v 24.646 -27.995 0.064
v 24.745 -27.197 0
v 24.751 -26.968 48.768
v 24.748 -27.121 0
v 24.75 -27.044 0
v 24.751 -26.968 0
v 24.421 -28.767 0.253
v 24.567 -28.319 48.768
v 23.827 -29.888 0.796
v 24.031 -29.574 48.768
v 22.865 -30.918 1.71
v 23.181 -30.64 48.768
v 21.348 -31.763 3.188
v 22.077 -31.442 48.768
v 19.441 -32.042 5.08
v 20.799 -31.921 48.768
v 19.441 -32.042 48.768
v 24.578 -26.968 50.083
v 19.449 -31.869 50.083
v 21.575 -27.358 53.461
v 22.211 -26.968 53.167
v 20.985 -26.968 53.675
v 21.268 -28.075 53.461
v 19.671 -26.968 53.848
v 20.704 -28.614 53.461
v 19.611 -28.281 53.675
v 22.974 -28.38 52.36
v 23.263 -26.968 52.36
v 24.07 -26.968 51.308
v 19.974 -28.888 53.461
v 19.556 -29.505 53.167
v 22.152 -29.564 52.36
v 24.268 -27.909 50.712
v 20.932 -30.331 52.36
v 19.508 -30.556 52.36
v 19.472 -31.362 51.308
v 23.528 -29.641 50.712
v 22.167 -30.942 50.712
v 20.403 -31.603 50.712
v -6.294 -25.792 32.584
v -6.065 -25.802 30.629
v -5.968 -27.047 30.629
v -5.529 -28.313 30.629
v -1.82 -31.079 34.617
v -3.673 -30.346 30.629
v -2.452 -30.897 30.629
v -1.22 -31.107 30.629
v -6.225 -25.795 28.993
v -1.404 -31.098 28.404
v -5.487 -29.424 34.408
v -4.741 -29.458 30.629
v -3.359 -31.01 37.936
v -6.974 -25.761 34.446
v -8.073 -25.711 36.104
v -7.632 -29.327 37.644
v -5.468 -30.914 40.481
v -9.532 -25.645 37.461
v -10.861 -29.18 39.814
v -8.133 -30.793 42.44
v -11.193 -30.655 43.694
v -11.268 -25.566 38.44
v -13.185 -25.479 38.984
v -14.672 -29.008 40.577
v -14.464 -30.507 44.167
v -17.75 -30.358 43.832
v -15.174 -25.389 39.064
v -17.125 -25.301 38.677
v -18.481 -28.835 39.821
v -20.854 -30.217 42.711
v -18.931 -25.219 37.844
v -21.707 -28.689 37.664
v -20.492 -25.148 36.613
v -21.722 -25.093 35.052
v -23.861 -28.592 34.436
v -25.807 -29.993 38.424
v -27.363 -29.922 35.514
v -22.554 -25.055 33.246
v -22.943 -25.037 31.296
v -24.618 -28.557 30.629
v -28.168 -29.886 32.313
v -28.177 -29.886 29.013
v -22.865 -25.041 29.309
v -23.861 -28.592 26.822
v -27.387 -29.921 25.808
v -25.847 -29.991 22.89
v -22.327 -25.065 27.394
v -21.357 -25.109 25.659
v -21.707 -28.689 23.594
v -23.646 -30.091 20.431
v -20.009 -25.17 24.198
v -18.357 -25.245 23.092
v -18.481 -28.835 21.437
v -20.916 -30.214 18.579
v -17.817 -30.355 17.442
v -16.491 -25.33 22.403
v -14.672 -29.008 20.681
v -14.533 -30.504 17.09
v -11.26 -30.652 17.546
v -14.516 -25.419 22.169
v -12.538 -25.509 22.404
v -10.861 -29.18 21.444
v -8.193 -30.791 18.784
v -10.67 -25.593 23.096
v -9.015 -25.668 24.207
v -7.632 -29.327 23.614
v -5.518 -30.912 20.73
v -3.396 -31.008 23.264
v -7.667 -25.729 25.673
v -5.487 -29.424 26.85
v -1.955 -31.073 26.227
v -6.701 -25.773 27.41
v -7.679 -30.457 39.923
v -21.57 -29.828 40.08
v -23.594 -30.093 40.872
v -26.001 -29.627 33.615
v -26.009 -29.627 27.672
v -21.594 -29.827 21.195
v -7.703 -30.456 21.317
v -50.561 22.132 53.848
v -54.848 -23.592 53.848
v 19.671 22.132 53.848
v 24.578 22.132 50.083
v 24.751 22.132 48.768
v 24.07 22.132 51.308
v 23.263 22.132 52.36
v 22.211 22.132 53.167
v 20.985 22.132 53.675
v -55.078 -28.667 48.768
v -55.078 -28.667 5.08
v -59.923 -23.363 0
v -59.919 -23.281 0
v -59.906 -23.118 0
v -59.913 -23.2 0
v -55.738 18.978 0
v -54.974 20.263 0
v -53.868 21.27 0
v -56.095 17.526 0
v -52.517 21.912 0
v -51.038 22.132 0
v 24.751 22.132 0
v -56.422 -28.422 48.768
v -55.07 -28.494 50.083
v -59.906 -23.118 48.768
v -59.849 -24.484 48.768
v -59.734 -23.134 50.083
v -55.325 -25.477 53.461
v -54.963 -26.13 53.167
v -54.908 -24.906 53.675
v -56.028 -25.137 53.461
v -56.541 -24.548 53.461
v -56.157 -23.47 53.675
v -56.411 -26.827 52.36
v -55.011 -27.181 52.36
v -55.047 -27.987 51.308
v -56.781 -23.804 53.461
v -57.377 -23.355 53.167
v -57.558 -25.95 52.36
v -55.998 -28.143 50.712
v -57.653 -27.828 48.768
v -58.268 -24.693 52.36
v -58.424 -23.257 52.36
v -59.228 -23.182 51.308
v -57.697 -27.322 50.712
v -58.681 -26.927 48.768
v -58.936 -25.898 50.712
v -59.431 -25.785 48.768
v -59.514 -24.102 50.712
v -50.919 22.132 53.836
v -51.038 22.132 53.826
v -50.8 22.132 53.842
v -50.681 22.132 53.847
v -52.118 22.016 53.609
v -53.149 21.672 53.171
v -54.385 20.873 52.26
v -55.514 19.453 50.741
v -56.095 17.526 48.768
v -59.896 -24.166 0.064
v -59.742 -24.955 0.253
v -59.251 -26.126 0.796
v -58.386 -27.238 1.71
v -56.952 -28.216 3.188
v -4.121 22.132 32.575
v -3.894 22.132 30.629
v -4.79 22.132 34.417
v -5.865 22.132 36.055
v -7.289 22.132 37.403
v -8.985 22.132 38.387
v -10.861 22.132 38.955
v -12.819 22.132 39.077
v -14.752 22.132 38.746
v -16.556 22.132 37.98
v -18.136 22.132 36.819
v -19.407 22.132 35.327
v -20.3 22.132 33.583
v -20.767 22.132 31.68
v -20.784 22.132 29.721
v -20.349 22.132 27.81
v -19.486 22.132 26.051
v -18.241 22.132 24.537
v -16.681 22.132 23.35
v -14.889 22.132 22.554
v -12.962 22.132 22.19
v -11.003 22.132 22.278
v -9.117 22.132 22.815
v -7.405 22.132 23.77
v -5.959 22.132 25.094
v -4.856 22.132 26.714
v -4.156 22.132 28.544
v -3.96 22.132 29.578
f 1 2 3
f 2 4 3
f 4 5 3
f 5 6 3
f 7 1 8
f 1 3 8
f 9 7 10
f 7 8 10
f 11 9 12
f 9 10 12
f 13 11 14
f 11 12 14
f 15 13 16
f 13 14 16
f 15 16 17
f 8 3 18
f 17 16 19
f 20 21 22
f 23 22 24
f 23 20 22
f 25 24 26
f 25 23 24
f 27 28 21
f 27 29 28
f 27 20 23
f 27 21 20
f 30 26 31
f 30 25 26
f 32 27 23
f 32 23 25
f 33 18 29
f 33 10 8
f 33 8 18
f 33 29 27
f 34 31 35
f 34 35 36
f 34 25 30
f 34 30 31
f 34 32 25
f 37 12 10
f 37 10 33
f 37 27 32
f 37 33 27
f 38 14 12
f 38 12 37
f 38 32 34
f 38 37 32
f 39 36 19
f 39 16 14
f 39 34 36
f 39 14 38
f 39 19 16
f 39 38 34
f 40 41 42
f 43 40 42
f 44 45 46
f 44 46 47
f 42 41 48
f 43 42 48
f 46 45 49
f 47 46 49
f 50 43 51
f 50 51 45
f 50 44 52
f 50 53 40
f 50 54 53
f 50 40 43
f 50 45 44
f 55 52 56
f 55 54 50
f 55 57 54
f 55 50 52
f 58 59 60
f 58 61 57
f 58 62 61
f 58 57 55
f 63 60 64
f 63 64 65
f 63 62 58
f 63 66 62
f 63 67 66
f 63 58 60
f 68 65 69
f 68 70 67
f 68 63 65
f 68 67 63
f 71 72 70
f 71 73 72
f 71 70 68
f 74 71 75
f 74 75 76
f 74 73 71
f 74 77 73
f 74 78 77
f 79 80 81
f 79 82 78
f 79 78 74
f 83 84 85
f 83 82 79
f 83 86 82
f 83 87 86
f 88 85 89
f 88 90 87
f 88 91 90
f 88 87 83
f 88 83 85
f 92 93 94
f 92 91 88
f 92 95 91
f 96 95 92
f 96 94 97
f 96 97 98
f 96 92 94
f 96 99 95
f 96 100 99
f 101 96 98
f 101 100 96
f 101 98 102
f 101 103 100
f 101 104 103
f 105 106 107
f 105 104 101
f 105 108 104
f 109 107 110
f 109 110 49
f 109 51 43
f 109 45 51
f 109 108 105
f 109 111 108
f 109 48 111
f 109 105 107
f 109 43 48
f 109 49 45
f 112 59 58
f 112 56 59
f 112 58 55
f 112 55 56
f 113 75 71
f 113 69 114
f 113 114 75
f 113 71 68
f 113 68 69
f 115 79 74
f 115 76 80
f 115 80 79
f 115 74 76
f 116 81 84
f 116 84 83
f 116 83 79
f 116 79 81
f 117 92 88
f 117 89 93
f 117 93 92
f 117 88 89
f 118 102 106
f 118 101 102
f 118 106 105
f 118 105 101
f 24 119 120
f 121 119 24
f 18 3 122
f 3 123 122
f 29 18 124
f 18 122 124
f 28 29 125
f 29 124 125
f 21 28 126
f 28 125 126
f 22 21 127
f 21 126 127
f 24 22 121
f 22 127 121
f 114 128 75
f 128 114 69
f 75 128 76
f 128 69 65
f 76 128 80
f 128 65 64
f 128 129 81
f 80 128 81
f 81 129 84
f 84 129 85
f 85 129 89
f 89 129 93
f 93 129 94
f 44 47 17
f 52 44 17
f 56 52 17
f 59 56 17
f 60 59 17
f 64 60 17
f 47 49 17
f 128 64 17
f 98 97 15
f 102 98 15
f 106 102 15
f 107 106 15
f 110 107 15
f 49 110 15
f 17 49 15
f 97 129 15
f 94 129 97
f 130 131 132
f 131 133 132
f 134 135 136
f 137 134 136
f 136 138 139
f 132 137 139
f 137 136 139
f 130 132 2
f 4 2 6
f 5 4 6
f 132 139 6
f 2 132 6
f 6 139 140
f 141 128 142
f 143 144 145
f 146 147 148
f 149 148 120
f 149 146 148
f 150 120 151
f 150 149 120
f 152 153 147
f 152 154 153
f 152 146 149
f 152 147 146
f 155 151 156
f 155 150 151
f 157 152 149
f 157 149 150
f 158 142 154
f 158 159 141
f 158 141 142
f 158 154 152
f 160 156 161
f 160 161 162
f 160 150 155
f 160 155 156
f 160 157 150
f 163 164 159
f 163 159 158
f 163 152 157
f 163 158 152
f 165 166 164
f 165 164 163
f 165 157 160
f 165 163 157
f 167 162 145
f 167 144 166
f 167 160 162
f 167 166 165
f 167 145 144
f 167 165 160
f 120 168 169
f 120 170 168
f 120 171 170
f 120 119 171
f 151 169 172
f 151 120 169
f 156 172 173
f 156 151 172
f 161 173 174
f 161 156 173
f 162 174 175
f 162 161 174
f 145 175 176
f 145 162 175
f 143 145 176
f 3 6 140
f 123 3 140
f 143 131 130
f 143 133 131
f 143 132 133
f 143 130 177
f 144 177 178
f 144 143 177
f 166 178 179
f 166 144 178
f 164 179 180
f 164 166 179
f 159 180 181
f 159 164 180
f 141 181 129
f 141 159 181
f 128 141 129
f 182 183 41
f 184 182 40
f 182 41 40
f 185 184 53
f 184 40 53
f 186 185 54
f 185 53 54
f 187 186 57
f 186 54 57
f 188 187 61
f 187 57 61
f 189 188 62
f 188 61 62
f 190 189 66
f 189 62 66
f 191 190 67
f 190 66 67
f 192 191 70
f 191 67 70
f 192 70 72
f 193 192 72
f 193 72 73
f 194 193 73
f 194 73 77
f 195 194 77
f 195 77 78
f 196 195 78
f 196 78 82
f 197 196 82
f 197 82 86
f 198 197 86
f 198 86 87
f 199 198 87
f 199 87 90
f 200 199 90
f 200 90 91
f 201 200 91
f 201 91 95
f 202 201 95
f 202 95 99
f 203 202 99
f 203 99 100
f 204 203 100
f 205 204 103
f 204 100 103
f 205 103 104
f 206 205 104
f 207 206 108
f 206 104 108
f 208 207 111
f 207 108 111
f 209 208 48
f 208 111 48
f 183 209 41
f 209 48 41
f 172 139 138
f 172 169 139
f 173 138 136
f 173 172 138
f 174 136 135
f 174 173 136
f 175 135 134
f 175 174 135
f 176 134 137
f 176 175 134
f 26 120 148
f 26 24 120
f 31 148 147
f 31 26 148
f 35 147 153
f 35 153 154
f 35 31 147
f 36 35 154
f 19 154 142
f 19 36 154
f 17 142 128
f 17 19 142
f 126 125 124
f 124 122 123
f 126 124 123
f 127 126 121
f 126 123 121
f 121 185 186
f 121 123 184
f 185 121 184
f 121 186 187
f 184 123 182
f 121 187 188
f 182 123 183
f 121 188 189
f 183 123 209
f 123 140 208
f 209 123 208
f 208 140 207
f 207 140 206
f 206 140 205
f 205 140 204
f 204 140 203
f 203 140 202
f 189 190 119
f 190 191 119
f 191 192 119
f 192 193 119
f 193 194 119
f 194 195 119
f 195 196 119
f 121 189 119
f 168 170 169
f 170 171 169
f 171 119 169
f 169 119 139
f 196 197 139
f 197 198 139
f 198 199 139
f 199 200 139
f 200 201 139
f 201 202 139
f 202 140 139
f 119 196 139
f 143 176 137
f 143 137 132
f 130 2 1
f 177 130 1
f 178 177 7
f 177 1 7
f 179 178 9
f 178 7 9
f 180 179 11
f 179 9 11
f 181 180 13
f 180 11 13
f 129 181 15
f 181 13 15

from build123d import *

# Parameters (mm, degrees)
F1_DEPTH = 53.848
F2_R     = 8.4604896976
F3_DEPTH = 64.262
F4_R     = 5.08


with BuildPart() as f1:
    # F0 (on Top) → F1 (new body)
    with BuildSketch(Plane.XY):
        Polygon((24.7506033629, 22.1318155527), (-55.6636229157, 22.1318155527), (-60.4034848511, -28.4259710461), (24.7506033629, -32.2828106582), align=None)
    extrude(amount=F1_DEPTH)

    # F2 (on face) → F3 (cut)
    with BuildSketch(Plane(origin=(-1.4085054524, -31.0979998146, 0), x_dir=(0.9989758712, -0.045246092, 0), z_dir=(-0.045246092, -0.9989758712, 0))):
        with Locations((-13.3521184325, 30.6290015578)):
            Circle(F2_R)
    extrude(amount=-F3_DEPTH, mode=Mode.SUBTRACT)

    # F4
    f4_edges = [f1.edges().sort_by_distance(p)[0] for p in [
        (-60.403485, -28.425971, 26.924),
        (-17.826441, -30.354391, 0),
        (-17.826441, -30.354391, 53.848),
        (24.750603, -32.282811, 26.924),
        (-23.198775, -30.111065, 30.629002),
        (-58.033554, -3.147078, 53.848),
        (-55.663623, 22.131816, 26.924),
        (24.750603, -5.075498, 53.848),
    ]]
    fillet(f4_edges, radius=F4_R)


solid = f1.part
